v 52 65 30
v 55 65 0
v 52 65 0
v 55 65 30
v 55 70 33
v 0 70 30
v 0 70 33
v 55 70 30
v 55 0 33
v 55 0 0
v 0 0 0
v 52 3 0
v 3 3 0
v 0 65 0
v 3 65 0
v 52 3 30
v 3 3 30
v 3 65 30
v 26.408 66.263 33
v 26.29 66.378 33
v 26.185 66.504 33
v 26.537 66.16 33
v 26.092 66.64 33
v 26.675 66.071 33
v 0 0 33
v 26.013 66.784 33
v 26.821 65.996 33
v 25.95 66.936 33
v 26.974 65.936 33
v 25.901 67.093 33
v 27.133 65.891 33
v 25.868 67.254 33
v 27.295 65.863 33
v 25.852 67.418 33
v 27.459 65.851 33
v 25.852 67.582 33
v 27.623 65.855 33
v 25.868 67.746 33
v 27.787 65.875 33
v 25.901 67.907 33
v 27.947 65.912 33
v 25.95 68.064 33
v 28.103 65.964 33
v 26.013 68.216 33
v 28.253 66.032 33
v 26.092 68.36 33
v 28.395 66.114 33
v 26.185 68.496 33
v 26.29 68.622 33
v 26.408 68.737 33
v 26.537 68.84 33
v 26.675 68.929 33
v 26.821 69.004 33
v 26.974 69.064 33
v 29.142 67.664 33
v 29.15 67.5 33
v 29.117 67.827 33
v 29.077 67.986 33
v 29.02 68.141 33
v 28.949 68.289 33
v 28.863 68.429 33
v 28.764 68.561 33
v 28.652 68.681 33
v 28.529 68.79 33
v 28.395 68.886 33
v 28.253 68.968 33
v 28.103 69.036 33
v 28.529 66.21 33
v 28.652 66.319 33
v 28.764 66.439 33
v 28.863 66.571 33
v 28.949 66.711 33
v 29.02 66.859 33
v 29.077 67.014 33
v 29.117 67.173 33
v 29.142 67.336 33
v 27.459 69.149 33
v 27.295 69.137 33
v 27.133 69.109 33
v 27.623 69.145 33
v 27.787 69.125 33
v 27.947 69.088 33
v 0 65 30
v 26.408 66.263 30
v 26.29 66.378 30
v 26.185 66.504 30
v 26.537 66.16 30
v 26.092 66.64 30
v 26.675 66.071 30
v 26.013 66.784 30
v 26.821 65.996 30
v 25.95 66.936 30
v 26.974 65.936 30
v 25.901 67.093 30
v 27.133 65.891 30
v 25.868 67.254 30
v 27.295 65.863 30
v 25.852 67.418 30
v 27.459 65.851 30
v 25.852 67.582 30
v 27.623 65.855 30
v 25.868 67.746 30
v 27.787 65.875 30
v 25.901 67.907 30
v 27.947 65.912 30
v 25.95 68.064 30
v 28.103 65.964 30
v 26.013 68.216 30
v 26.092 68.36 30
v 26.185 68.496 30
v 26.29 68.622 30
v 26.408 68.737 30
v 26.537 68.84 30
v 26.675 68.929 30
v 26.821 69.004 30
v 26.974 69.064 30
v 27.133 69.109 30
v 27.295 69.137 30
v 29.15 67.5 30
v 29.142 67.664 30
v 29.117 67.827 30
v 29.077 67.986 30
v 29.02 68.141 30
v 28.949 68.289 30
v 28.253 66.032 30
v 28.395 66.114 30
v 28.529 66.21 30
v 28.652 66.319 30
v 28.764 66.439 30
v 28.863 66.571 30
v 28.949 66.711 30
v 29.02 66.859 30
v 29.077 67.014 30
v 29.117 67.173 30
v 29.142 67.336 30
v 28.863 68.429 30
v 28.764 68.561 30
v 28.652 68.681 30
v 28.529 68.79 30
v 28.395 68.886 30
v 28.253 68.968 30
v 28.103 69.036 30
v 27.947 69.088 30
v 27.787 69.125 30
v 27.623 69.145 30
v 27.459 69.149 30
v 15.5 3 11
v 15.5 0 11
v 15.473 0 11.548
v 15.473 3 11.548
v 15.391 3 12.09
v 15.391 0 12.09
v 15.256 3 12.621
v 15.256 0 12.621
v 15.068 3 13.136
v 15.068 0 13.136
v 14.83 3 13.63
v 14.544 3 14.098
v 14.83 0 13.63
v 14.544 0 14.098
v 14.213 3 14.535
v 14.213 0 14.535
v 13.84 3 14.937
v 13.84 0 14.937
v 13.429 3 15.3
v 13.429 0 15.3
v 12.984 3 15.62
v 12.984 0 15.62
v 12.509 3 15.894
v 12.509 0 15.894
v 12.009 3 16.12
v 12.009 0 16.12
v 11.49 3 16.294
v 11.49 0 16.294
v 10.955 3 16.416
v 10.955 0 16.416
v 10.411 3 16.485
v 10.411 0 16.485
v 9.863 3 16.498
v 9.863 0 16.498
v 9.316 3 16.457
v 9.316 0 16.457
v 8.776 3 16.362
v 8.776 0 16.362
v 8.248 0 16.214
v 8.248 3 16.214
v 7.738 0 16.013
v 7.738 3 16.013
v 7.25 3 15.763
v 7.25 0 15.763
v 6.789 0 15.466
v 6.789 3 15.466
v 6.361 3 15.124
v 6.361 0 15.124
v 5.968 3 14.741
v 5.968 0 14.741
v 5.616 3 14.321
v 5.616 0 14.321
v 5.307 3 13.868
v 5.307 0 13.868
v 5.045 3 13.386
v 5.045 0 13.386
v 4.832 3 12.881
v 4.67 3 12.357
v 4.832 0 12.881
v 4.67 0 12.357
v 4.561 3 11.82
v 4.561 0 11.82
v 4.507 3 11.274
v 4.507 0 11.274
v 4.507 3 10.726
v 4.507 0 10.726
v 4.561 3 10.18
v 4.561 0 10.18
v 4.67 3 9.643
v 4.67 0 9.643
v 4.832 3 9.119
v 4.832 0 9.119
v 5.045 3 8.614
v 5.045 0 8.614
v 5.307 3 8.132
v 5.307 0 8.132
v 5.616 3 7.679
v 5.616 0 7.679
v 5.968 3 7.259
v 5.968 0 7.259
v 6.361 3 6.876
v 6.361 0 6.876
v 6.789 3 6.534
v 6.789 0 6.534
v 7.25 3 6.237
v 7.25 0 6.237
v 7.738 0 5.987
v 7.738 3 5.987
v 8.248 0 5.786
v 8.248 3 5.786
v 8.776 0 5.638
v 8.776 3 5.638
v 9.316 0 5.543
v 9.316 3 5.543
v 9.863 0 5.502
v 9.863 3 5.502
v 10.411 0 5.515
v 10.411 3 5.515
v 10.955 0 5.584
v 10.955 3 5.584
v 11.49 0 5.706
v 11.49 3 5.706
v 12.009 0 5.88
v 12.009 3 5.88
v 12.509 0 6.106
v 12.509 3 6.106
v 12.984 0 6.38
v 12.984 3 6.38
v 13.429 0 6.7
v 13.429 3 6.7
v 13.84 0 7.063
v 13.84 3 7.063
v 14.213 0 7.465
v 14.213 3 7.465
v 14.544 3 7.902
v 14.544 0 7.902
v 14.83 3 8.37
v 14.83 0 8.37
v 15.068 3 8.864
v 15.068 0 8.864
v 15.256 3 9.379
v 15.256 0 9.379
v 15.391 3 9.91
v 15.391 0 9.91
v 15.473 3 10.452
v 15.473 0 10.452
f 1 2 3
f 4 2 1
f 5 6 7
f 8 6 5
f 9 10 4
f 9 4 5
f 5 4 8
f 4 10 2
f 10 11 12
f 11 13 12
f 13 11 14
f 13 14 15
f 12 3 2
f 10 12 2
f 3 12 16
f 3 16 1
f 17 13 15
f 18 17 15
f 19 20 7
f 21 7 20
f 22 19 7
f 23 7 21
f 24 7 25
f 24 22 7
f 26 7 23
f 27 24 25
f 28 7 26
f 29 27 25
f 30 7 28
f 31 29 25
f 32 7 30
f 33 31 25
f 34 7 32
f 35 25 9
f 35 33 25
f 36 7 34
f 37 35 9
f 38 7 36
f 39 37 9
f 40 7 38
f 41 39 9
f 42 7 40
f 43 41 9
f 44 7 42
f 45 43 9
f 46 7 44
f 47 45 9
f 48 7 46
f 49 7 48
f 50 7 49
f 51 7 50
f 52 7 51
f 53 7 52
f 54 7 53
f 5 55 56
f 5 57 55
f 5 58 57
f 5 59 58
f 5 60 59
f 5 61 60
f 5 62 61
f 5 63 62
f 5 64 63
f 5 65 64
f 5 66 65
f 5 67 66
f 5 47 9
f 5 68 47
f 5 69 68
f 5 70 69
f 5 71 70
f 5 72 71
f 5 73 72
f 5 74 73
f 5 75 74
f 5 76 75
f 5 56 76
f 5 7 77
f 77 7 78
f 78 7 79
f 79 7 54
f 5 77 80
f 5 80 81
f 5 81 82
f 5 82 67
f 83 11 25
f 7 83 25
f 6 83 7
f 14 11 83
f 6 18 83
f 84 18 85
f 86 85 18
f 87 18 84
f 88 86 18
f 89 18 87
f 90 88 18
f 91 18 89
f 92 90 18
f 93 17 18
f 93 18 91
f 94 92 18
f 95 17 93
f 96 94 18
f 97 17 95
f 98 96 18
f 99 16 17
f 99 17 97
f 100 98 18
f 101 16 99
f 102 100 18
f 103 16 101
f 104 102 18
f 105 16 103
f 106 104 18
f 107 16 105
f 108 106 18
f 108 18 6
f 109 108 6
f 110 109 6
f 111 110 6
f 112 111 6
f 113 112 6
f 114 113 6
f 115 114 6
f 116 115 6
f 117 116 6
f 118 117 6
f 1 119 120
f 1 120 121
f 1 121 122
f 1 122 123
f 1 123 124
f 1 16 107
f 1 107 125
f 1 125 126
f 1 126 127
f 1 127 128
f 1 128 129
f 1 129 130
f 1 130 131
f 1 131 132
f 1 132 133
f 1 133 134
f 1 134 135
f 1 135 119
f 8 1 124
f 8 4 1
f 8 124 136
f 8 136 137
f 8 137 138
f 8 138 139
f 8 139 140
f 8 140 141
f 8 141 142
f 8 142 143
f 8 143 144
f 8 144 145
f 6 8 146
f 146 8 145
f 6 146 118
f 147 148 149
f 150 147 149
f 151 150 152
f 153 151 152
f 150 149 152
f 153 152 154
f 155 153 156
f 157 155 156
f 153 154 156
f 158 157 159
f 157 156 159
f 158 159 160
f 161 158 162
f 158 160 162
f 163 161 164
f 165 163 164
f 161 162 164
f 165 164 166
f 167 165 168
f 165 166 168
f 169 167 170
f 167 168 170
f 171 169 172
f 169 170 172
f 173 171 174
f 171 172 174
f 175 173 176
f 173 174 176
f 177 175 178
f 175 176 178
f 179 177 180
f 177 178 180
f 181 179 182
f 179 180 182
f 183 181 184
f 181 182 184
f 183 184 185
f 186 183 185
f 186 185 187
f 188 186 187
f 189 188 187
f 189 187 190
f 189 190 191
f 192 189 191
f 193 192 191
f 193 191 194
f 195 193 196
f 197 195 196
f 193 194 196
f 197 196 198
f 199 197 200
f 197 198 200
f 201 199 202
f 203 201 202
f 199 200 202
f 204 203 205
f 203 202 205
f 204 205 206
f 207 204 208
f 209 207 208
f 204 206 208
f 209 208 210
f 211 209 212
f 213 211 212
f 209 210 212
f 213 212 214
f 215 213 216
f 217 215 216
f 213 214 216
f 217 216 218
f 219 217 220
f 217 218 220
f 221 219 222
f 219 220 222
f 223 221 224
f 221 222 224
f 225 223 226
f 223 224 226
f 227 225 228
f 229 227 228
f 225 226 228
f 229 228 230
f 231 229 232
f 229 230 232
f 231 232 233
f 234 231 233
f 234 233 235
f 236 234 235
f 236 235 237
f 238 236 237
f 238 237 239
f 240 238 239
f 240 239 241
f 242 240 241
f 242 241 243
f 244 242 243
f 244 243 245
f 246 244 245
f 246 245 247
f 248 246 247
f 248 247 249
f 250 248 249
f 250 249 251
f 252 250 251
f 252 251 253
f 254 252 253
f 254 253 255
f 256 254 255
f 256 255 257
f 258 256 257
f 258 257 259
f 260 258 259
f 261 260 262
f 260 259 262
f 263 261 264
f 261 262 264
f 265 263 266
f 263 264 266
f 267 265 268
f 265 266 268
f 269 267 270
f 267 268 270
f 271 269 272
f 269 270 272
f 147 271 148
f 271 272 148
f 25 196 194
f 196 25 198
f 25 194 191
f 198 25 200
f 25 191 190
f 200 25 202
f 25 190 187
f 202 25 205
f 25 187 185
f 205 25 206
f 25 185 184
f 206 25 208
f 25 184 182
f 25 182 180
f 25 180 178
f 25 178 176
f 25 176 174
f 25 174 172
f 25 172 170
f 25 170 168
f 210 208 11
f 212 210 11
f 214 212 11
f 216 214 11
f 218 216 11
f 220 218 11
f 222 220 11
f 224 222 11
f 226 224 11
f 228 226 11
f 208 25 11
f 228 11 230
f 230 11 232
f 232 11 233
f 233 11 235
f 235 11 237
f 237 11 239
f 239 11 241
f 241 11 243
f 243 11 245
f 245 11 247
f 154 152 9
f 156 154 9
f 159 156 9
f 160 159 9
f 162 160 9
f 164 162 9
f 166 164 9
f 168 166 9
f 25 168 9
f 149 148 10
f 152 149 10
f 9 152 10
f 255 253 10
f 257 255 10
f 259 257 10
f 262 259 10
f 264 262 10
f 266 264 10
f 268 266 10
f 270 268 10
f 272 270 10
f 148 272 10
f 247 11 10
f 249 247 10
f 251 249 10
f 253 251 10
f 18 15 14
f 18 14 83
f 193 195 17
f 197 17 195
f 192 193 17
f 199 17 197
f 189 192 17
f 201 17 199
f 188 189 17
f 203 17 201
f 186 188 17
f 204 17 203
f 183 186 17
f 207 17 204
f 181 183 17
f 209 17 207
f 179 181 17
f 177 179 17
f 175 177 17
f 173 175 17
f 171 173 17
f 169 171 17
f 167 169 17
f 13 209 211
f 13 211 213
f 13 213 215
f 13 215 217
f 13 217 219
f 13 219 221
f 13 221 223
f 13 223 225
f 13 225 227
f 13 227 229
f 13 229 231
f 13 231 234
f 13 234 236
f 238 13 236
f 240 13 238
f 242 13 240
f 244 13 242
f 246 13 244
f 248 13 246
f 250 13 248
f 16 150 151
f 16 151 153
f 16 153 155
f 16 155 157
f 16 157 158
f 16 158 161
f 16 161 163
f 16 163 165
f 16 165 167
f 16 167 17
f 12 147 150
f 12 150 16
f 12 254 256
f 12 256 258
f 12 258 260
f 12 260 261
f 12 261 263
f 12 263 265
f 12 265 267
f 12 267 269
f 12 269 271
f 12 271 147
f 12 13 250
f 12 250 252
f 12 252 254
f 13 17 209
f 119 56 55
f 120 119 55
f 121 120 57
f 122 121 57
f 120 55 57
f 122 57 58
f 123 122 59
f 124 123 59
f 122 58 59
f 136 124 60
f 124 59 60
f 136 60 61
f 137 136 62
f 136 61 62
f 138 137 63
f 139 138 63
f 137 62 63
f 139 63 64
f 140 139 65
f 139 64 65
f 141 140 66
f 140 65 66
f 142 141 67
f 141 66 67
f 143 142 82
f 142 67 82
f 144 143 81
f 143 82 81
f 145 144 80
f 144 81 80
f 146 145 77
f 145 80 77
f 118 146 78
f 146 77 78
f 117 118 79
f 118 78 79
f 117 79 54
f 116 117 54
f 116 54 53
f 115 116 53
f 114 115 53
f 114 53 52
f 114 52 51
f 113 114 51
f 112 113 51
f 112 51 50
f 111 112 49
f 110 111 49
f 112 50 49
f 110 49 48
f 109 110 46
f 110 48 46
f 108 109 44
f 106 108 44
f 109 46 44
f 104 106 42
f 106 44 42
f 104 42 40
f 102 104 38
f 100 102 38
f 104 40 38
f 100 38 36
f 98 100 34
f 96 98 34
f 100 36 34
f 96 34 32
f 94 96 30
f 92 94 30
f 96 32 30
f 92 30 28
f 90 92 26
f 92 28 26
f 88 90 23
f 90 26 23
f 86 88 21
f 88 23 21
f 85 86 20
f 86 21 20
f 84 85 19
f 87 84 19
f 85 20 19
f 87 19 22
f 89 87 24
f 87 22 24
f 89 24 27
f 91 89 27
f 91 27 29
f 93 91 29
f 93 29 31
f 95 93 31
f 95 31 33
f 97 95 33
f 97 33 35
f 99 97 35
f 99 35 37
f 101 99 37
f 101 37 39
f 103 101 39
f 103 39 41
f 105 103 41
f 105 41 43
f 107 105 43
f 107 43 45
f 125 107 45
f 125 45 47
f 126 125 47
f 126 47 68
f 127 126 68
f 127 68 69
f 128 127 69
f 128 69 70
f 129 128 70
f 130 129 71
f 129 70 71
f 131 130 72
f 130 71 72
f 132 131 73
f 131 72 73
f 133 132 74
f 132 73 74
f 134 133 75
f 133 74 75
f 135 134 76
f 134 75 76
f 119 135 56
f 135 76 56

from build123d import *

# Parameters (mm, degrees)
F0_W     = 55
F0_H     = 70
F1_DEPTH = 33
F2_T     = -3
F3_W     = 5
F3_H     = 30
F4_DEPTH = 55
F5_R     = 5.5
F6_DEPTH = 3
F7_R     = 1.65
F8_DEPTH = 3


with BuildPart() as f1:
    # F0 (on Top) → F1 (new body)
    with BuildSketch(Plane.XY):
        with Locations((27.5, 35)):
            Rectangle(F0_W, F0_H)
    extrude(amount=F1_DEPTH)

    # F2
    f2_openings = [f1.faces().sort_by_distance(p)[0] for p in [
        (27.5, 35, 0),
    ]]
    offset(amount=F2_T, openings=f2_openings)

    # F3 (on face) → F4 (cut, through all)
    with BuildSketch(Plane.YZ.offset(55)):
        with Locations((67.5, 15)):
            Rectangle(F3_W, F3_H)
    extrude(amount=-F4_DEPTH, mode=Mode.SUBTRACT)

    # F5 (on face) → F6 (cut, through all)
    with BuildSketch(Plane.XZ):
        with Locations((10, 11)):
            Circle(F5_R)
    extrude(amount=-F6_DEPTH, mode=Mode.SUBTRACT)

    # F7 (on face) → F8 (cut, through all)
    with BuildSketch(Plane.XY.offset(33)):
        with Locations((27.5, 67.5)):
            Circle(F7_R)
    extrude(amount=-F8_DEPTH, mode=Mode.SUBTRACT)


solid = f1.part
